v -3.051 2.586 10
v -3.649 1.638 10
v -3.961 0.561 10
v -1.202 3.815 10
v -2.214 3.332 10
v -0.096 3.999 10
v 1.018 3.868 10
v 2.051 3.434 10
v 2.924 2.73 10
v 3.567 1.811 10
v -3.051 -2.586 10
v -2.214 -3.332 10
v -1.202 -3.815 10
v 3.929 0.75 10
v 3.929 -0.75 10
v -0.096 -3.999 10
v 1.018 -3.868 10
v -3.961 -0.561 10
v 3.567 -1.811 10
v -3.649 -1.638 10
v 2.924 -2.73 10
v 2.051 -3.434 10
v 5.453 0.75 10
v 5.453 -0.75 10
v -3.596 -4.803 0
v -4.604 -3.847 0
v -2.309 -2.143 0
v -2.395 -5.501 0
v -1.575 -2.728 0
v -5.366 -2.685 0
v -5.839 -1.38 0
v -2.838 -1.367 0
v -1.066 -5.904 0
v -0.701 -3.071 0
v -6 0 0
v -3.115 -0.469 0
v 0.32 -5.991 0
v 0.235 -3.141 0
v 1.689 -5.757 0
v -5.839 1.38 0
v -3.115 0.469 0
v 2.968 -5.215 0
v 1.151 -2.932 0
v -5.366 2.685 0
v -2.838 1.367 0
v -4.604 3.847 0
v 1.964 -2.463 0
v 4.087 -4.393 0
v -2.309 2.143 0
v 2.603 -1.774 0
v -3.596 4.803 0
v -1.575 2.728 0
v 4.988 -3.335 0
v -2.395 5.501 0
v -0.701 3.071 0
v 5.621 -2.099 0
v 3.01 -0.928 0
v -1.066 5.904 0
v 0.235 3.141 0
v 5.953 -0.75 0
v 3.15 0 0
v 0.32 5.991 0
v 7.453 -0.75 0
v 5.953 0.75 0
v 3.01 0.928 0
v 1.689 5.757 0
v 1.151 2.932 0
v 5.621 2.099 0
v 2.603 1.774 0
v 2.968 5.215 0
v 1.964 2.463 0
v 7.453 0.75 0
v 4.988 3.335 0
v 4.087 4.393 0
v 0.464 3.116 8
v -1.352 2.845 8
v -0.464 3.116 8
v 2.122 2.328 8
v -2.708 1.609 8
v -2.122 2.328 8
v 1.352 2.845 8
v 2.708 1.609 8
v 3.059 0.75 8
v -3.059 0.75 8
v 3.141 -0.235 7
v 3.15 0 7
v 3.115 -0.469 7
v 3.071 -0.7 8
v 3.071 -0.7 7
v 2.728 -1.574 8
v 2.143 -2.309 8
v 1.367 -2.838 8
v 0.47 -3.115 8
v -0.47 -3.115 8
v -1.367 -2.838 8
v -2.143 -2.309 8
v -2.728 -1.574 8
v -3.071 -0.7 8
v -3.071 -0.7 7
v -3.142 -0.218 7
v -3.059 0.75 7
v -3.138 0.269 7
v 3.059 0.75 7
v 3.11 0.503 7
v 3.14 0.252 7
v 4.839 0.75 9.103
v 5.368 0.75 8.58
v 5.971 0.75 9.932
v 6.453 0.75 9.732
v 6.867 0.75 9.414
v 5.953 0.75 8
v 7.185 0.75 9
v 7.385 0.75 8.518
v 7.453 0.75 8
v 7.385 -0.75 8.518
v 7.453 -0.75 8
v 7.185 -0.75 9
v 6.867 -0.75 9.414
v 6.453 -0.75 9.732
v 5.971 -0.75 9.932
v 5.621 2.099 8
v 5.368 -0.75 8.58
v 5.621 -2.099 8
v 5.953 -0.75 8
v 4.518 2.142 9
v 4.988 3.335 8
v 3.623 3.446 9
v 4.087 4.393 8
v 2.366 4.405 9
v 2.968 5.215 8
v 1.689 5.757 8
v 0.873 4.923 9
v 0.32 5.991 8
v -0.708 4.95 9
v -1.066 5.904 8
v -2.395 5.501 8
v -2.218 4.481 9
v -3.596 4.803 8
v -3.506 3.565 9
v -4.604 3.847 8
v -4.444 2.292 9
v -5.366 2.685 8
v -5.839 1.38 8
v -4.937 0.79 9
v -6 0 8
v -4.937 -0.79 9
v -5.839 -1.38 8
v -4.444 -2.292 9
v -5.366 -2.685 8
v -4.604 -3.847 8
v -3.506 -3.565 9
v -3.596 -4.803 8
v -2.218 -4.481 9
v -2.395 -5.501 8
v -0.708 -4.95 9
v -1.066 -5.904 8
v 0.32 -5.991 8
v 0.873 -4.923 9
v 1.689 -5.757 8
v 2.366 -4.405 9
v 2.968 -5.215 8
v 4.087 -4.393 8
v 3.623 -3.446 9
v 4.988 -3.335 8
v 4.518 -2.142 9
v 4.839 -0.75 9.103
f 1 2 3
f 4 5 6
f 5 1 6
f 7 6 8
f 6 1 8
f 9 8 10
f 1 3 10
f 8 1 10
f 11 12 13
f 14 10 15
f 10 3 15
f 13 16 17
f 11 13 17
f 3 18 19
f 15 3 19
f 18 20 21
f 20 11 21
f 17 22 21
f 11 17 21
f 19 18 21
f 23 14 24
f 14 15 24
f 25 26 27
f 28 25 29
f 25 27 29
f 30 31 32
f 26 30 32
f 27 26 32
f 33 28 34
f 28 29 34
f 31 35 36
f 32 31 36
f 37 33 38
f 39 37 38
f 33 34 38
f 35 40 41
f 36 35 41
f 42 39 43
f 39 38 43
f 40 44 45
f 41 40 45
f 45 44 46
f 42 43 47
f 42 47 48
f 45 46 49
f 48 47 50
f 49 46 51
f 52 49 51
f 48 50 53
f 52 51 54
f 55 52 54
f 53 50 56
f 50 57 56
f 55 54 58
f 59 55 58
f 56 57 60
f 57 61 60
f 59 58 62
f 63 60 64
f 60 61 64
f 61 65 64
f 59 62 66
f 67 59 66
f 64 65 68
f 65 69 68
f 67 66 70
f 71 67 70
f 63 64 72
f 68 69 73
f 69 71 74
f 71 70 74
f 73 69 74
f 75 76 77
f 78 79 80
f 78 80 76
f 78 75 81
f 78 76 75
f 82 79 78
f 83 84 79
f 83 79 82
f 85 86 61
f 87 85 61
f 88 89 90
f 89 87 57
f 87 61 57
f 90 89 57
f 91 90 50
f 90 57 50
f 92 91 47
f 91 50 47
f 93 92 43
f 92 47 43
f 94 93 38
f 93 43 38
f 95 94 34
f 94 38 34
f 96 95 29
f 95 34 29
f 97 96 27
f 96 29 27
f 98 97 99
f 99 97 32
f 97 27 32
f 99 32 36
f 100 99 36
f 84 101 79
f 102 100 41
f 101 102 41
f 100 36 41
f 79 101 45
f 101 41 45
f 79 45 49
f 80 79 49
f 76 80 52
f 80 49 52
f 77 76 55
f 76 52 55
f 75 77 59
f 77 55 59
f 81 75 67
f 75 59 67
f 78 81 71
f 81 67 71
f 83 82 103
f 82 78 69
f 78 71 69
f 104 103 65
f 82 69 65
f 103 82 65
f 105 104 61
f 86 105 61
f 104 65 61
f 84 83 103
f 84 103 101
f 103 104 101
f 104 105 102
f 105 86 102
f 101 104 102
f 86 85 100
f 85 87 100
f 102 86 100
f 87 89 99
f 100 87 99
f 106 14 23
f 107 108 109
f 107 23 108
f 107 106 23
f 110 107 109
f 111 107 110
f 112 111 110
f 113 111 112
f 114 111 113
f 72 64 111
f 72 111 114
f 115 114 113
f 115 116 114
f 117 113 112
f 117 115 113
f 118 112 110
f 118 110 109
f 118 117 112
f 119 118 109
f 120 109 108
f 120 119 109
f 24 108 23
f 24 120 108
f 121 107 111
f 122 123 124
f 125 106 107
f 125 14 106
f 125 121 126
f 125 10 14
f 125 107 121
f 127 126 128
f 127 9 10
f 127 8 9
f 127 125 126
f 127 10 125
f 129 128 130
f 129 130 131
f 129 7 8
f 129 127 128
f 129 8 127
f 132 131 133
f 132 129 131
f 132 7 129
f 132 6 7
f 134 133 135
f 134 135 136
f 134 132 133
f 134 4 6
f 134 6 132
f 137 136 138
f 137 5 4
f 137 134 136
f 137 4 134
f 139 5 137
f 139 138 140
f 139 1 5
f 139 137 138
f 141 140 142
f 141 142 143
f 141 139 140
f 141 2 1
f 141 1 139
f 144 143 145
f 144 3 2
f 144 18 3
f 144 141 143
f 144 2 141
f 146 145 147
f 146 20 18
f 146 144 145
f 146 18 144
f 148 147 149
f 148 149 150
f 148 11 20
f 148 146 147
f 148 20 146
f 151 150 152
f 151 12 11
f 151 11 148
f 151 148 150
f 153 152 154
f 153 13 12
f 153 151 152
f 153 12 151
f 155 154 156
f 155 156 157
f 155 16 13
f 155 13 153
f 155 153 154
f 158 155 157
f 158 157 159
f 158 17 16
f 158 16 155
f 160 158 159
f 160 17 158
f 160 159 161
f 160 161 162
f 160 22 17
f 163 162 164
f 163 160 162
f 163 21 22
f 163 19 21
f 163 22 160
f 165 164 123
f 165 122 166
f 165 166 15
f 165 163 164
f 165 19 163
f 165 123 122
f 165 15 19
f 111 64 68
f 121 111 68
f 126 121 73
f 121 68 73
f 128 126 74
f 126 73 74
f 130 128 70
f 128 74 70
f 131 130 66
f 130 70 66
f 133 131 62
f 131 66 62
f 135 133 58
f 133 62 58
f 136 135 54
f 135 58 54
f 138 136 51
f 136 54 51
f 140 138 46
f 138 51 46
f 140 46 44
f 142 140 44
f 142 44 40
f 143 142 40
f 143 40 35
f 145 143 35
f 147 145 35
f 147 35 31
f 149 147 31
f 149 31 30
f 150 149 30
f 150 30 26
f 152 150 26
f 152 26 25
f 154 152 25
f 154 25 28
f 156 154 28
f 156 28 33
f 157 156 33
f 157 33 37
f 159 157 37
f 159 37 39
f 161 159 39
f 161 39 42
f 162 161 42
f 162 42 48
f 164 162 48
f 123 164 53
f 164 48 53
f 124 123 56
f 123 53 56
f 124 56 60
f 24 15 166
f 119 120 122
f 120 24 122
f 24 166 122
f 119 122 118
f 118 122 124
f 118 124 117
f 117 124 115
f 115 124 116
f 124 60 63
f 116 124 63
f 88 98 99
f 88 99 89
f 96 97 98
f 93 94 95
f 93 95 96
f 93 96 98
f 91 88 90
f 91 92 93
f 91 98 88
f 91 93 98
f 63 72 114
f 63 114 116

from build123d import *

# Parameters (mm, degrees)
SKETCH_R     = 6
PAD_DEPTH    = 10
SKETCH001_R  = 3.15
POCKET_DEPTH = 8
PAD001_DEPTH = 1
SKETCH003_W  = 1.5
SKETCH003_H  = 1.5
PAD002_DEPTH = 10
CHAMFER_SIZE = 2
FILLET_R     = 2


with BuildPart() as part:
    # Sketch → Pad (new body)
    with BuildSketch(Plane.XY):
        Circle(SKETCH_R)
    extrude(amount=PAD_DEPTH)

    # Sketch001 (on Face2 of Pad) → Pocket (cut)
    with BuildSketch(Plane(origin=(0, 0, 0), x_dir=(1, 0, 0), z_dir=(0, 0, -1))):
        Circle(SKETCH001_R)
    extrude(amount=-POCKET_DEPTH, mode=Mode.SUBTRACT)

    # Sketch002 (on Face5 of Pocket) → Pad001 (join)
    with BuildSketch(Plane(origin=(0, 0, 8), x_dir=(1, 0, 0), z_dir=(0, 0, -1))):
        with BuildLine():
            Line((-3.071238, 0.7), (3.071238, 0.7))
            ThreePointArc((3.059412, -0.75), (3.149895, -0.02569), (3.071238, 0.7))
            Line((3.059412, -0.75), (-3.059412, -0.75))
            ThreePointArc((-3.071238, 0.7), (-3.149895, -0.02569), (-3.059412, -0.75))
        make_face()
    extrude(amount=PAD001_DEPTH)

    # Sketch003 (on Face2 of Pad001) → Pad002 (join)
    with BuildSketch(Plane(origin=(0, 0, 0), x_dir=(1, 0, 0), z_dir=(0, 0, -1))):
        with Locations((6.70294, 0)):
            Rectangle(SKETCH003_W, SKETCH003_H)
    extrude(amount=-PAD002_DEPTH)

    # Chamfer
    chamfer_edges = [part.edges().sort_by_distance(p)[0] for p in [
        (-6, 0, 10),
    ]]
    chamfer(chamfer_edges, length=CHAMFER_SIZE)

    # Fillet
    fillet_edges = [part.edges().sort_by_distance(p)[0] for p in [
        (7.45294, 0, 10),
    ]]
    fillet(fillet_edges, radius=FILLET_R)


solid = part.part
